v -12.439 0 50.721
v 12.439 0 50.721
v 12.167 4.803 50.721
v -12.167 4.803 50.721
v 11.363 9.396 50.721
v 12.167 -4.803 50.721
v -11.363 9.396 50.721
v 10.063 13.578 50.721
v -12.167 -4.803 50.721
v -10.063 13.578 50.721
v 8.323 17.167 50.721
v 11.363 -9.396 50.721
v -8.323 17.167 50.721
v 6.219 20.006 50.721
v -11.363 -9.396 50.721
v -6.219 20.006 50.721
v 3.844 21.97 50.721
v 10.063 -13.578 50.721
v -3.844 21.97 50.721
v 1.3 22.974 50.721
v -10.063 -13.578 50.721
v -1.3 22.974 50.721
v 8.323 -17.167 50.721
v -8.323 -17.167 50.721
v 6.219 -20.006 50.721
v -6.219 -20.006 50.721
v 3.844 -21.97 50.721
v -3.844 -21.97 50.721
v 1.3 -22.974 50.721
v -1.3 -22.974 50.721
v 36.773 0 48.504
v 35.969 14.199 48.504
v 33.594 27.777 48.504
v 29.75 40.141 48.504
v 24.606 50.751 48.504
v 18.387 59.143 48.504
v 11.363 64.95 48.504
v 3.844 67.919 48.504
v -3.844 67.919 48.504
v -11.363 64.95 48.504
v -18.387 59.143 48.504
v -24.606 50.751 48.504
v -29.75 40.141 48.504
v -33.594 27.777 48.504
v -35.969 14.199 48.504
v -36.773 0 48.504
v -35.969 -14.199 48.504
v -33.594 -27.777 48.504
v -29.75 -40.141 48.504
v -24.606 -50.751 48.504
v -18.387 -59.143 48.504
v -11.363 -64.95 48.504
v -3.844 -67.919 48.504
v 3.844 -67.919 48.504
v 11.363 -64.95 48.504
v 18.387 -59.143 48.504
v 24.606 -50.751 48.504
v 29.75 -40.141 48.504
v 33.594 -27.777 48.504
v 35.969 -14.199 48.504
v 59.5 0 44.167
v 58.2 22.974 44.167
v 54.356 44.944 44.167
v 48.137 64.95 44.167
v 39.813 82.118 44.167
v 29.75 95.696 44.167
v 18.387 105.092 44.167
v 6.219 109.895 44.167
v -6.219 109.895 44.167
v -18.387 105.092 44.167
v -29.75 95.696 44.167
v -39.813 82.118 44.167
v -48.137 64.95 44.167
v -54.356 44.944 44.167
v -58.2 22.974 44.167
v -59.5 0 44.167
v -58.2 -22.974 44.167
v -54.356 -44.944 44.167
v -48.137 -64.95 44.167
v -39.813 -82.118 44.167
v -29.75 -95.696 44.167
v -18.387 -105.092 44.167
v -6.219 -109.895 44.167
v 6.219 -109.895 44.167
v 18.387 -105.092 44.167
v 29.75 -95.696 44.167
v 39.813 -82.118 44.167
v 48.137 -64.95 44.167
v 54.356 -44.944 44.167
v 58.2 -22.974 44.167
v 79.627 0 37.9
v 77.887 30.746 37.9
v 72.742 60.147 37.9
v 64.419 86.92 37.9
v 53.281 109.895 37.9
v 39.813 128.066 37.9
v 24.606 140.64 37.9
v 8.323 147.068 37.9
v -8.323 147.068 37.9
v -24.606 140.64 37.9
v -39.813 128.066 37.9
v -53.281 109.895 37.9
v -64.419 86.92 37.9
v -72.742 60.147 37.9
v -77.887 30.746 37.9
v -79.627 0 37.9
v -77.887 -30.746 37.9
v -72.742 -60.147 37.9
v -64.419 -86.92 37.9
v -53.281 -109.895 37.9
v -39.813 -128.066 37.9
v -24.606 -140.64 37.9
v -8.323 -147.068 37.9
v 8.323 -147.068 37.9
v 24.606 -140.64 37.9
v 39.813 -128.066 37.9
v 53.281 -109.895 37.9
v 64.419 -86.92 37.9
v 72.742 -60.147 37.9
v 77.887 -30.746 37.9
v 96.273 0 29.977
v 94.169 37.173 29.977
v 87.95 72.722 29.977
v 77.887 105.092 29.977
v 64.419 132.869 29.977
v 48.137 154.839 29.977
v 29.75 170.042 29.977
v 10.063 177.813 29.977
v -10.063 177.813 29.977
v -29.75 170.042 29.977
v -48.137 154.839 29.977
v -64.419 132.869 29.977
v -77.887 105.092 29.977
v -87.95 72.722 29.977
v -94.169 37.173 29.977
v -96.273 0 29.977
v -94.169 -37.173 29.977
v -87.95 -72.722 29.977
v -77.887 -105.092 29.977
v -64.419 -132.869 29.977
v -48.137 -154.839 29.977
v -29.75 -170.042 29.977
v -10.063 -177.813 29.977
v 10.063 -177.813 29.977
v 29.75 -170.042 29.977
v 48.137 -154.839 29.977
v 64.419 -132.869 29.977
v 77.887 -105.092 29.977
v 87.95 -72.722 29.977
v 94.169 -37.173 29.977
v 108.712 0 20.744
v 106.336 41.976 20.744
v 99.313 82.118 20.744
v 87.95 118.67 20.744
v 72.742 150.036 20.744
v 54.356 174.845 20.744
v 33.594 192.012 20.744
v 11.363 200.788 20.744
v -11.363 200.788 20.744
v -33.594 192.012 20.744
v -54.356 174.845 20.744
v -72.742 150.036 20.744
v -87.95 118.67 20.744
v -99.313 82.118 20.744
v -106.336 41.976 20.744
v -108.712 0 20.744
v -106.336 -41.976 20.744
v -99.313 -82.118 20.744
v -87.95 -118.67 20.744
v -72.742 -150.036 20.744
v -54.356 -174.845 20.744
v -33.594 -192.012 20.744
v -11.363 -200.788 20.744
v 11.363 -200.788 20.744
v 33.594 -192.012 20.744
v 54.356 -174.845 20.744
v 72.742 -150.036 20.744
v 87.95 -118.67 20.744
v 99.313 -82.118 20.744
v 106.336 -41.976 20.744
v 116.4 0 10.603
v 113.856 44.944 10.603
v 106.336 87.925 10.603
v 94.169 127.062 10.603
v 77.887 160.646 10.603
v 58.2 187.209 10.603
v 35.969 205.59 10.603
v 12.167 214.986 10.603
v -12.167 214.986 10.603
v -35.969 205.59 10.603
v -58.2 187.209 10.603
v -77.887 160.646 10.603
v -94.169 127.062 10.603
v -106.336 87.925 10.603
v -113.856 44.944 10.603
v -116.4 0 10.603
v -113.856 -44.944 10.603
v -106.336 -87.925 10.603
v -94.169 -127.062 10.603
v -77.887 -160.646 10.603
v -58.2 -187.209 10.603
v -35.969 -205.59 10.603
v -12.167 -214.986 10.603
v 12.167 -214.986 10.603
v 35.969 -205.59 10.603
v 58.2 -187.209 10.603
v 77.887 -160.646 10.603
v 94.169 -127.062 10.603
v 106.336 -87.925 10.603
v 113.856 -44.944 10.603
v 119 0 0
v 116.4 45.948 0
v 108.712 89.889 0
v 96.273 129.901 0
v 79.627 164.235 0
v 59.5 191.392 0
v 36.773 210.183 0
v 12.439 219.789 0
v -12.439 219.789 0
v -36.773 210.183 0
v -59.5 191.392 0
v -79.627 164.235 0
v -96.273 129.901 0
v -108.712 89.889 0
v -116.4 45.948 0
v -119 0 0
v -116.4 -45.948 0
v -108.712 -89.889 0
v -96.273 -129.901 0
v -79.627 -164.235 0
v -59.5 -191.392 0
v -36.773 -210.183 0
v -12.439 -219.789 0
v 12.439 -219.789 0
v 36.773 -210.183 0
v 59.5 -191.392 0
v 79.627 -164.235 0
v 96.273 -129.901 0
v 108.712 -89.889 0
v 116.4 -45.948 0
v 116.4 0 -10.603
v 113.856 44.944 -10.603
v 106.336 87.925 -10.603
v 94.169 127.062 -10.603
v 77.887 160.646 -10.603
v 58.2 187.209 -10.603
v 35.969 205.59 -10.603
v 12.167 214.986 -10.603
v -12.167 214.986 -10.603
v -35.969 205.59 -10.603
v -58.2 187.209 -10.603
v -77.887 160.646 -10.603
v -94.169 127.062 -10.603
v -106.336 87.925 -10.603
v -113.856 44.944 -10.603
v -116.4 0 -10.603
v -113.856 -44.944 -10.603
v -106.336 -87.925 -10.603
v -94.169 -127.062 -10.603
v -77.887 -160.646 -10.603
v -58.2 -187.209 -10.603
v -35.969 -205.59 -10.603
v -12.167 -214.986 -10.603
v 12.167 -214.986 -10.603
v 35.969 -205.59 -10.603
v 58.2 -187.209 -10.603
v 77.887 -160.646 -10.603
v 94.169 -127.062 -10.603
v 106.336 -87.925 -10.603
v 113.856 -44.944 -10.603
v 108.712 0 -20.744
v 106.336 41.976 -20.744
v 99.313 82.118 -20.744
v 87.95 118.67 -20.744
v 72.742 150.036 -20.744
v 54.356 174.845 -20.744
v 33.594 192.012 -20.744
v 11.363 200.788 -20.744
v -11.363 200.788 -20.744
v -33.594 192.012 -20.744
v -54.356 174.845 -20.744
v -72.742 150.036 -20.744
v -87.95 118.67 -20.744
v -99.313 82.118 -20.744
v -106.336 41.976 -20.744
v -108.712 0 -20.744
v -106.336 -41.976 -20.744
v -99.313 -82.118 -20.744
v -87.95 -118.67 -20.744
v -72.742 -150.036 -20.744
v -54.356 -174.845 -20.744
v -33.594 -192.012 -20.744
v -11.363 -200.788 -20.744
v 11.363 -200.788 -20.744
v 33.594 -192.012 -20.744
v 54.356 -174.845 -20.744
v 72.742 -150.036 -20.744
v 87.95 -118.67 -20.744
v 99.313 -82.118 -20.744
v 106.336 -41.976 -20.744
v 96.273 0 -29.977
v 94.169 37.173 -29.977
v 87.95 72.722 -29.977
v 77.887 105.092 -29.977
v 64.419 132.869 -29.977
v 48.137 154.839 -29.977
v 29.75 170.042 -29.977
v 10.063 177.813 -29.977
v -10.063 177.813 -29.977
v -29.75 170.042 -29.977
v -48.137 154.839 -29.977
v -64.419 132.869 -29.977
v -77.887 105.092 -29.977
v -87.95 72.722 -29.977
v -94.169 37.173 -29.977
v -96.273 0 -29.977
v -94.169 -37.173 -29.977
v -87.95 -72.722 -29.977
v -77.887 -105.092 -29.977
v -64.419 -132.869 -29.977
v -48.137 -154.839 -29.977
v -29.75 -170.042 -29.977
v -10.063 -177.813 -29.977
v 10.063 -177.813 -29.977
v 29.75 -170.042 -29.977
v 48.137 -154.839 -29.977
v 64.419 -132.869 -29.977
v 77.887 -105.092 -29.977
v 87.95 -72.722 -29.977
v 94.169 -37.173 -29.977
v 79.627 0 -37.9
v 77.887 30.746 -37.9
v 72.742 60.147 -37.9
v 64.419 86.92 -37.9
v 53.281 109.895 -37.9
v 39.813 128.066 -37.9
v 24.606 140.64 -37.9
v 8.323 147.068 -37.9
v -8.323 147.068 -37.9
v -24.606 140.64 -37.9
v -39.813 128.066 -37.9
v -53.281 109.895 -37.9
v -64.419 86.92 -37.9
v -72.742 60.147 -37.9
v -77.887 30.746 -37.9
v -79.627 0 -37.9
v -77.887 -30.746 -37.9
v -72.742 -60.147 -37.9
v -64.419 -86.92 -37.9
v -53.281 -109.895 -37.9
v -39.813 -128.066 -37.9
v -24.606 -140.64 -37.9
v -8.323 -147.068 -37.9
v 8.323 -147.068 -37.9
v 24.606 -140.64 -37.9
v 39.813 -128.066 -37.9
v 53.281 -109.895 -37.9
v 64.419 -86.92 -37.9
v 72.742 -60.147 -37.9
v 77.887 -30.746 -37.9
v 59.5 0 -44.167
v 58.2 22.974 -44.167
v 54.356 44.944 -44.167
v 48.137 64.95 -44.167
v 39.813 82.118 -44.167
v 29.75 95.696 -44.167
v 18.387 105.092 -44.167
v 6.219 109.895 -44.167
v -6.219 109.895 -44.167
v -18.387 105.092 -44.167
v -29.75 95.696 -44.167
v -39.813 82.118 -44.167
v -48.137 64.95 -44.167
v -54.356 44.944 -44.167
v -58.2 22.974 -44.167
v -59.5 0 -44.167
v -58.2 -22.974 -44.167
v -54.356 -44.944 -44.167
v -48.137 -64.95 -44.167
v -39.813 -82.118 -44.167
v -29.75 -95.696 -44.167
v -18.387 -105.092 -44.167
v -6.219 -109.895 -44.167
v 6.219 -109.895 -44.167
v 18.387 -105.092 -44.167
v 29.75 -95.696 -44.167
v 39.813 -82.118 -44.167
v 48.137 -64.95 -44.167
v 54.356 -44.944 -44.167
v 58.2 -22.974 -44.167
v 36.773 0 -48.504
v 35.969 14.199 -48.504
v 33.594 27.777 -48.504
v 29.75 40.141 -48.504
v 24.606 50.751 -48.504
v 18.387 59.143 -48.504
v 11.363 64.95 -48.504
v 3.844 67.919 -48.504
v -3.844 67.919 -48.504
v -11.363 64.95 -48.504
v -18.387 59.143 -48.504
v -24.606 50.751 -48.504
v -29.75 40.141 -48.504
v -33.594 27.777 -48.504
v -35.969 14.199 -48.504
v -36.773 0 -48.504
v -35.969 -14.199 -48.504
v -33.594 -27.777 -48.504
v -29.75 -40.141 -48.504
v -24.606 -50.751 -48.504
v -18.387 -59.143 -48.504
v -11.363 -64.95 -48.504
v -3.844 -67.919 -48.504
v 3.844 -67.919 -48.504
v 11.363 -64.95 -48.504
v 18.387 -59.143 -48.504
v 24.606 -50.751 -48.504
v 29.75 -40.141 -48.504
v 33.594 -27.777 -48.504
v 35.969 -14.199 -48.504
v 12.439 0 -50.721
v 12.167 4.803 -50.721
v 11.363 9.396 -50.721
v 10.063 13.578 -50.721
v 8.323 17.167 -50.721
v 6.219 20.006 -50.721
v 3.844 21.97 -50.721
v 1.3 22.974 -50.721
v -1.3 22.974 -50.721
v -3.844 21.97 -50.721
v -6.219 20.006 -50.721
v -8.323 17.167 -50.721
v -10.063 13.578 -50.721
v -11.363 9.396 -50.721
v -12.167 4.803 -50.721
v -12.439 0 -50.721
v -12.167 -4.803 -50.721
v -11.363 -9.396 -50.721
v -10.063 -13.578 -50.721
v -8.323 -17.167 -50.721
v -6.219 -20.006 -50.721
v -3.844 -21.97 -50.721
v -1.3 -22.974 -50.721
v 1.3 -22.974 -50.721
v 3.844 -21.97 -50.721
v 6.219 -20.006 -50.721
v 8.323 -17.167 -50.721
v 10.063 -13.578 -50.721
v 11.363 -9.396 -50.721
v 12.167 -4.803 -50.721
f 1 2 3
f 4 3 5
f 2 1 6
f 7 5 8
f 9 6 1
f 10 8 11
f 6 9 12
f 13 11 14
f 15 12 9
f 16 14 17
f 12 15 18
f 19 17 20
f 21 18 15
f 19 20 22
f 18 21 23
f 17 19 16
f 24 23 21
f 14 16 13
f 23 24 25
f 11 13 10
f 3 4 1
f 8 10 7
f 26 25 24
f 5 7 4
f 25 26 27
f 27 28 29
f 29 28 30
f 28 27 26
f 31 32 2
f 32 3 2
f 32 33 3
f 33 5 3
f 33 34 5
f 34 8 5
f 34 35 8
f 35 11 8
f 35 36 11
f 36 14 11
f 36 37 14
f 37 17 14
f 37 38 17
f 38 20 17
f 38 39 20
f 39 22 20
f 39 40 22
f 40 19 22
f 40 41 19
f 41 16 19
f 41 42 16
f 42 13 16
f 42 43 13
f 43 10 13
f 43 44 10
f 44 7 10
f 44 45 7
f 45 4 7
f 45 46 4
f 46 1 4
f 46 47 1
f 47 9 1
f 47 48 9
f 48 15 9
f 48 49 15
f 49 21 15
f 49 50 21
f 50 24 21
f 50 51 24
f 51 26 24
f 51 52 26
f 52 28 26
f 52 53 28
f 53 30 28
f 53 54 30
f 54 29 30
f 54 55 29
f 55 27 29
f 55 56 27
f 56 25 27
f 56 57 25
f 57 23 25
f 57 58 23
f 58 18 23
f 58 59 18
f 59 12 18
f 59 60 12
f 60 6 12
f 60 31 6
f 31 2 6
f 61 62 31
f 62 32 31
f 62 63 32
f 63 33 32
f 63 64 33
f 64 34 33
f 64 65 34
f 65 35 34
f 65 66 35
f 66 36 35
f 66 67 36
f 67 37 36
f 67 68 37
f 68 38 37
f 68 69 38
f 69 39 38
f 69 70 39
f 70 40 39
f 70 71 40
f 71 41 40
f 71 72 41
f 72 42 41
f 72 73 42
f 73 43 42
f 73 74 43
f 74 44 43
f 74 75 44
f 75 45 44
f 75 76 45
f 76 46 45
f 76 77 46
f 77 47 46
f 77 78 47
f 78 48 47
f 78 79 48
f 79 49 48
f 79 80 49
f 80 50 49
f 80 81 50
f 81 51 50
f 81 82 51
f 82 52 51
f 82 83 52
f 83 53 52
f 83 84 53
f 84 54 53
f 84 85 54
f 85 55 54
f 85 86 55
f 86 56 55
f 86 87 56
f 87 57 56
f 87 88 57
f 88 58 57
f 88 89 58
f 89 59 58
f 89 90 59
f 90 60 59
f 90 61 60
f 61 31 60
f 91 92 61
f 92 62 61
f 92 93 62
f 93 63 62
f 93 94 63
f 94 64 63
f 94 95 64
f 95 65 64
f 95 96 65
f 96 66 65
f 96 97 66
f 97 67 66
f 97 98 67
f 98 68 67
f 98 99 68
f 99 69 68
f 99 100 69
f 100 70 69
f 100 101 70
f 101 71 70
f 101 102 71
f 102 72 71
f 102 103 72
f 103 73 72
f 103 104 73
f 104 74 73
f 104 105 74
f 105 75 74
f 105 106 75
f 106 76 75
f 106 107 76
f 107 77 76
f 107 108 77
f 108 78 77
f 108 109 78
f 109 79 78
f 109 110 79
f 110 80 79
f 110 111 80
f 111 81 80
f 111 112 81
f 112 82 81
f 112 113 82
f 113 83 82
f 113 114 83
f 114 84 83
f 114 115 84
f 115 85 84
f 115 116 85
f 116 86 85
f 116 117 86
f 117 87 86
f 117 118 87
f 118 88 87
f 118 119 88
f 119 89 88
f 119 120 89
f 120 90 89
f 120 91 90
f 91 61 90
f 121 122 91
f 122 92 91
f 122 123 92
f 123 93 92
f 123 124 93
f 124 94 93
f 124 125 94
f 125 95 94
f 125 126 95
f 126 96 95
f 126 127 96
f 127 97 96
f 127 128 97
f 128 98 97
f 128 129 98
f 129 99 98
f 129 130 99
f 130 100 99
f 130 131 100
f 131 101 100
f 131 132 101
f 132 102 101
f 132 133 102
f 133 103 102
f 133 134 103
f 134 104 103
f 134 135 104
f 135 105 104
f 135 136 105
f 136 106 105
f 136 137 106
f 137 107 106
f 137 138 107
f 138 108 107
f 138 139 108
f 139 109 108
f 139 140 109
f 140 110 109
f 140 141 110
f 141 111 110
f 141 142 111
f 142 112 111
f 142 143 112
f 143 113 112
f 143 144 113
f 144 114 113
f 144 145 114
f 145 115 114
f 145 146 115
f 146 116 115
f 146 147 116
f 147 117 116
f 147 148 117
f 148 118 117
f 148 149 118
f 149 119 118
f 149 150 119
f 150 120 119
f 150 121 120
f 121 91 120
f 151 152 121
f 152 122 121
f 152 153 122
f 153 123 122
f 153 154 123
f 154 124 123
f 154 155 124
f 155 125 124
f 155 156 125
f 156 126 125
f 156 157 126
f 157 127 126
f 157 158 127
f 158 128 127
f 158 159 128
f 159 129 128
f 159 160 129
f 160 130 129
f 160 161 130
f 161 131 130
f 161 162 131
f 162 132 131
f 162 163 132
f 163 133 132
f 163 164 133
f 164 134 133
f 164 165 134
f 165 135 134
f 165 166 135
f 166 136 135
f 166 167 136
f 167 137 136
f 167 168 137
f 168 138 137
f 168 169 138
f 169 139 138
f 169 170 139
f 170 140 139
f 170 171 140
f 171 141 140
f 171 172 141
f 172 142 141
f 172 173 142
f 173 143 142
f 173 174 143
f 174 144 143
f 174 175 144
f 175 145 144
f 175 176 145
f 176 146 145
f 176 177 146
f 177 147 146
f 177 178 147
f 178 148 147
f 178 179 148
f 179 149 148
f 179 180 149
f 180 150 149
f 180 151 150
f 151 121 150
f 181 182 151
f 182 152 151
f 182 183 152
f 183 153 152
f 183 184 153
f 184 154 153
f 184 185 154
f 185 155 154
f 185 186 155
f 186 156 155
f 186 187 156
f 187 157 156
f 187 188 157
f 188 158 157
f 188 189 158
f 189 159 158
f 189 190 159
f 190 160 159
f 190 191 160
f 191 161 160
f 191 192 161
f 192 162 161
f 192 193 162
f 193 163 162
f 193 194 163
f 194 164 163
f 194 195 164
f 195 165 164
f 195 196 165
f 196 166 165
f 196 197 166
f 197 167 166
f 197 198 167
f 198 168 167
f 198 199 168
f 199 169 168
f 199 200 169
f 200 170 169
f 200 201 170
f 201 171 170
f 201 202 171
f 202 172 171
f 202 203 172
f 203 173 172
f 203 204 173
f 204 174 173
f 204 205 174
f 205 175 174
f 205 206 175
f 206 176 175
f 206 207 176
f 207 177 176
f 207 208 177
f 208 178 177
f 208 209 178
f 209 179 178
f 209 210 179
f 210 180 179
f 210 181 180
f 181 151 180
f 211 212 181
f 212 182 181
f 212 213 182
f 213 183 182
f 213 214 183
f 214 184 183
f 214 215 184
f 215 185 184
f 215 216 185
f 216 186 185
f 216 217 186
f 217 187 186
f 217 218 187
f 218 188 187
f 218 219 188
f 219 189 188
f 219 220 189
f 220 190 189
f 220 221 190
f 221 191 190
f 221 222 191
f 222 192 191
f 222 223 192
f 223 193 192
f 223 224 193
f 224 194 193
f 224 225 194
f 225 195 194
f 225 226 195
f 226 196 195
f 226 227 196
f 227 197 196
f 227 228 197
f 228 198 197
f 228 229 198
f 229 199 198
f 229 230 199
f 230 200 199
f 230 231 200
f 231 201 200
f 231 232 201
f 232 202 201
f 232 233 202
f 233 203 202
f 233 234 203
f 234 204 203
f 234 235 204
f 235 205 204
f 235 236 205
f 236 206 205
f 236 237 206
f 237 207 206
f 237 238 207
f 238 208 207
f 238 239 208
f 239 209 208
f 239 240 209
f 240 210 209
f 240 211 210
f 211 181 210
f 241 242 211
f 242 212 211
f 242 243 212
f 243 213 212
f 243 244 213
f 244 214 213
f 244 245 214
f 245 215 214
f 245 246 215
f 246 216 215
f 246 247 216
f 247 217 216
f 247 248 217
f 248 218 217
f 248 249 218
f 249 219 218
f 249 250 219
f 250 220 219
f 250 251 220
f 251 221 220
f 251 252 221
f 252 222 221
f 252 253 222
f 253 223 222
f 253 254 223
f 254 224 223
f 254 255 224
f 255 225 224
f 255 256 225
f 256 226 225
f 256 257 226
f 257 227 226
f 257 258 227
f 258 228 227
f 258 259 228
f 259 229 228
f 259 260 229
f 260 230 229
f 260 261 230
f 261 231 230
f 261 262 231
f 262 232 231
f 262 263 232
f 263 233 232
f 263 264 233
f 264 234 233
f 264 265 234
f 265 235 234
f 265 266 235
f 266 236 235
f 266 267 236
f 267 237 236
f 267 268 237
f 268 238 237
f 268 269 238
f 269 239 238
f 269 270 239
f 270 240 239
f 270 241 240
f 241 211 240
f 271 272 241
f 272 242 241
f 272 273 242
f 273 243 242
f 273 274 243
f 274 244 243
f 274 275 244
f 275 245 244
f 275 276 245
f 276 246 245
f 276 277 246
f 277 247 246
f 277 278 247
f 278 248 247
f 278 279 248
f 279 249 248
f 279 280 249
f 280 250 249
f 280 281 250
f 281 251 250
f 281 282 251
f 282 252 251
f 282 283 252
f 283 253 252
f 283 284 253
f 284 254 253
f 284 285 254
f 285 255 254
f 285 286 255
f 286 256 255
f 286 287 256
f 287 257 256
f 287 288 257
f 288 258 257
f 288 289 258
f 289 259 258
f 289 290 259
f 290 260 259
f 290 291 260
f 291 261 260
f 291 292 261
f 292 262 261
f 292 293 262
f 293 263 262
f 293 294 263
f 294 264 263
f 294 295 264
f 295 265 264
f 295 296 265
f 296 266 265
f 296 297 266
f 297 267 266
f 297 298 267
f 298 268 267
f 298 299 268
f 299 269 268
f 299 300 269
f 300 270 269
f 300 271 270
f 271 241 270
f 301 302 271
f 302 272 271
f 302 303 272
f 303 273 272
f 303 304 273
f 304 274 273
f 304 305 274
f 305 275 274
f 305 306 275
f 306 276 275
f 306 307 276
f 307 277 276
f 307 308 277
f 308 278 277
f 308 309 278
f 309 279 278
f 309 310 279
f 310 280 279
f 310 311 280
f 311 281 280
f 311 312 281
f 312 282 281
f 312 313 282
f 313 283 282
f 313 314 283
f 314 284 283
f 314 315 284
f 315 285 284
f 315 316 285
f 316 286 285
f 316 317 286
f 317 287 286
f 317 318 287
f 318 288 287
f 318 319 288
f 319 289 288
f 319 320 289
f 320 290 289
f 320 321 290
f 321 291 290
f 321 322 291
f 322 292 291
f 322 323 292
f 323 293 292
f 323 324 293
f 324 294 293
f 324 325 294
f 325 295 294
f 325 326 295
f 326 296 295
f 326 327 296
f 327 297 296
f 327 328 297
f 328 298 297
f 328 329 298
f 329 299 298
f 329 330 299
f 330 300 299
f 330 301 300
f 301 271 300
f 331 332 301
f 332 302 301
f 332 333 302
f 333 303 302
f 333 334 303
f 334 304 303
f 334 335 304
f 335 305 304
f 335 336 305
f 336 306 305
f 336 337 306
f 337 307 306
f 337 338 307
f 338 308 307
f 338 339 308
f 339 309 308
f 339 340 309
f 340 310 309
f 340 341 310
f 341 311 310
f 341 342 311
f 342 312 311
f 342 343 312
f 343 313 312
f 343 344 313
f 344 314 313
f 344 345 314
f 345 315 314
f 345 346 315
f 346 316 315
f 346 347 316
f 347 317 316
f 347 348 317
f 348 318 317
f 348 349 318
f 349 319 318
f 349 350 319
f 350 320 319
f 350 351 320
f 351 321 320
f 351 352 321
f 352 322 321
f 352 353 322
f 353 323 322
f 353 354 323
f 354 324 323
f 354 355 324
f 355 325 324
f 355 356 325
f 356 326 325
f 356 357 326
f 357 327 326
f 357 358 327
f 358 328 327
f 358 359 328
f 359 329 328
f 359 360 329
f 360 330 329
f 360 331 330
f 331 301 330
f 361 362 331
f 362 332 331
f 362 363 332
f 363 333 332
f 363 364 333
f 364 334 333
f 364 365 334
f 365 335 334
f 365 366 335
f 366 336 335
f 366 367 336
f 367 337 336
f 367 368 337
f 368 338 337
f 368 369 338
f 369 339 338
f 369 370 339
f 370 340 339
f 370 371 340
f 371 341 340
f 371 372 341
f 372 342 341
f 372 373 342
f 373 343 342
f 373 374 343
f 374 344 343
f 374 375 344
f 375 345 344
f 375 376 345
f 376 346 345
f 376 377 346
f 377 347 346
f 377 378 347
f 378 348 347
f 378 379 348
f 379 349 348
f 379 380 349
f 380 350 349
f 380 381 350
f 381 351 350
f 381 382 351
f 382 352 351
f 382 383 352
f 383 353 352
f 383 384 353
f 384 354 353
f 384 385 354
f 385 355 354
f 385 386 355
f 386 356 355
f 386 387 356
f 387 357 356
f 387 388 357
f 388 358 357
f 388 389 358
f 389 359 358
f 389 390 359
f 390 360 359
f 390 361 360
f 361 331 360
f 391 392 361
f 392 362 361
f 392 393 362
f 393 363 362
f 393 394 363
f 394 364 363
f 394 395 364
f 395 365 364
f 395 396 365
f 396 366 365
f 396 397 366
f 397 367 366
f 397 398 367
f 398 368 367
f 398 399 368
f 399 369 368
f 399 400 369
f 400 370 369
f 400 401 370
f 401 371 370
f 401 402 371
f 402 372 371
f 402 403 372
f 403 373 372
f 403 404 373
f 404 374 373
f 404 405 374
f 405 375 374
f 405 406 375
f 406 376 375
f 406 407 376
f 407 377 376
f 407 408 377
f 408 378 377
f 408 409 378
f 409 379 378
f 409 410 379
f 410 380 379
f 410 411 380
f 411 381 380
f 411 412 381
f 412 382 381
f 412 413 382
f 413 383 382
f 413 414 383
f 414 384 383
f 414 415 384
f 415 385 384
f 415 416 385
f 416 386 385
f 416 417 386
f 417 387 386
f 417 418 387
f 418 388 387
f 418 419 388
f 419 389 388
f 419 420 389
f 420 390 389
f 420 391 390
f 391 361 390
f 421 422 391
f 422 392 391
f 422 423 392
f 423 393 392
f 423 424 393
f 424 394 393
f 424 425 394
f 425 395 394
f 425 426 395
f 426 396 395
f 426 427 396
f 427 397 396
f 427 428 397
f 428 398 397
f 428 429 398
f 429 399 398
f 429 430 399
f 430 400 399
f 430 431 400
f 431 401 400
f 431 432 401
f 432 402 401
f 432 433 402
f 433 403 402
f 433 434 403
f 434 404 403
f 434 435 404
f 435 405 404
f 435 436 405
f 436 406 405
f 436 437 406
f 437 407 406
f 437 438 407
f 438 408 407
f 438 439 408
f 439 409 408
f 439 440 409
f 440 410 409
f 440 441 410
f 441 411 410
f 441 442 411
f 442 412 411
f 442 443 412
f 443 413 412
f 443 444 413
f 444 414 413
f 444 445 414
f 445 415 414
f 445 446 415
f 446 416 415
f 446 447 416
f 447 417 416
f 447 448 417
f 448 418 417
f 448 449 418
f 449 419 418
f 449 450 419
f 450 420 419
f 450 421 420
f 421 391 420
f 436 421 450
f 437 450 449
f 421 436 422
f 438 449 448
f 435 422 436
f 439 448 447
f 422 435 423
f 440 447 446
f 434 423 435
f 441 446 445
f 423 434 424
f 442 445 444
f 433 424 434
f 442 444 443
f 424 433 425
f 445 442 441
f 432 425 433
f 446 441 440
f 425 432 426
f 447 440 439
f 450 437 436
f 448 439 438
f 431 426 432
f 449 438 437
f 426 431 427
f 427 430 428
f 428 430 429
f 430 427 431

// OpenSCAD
// Generated by SolidPython 1.0.1 on 2020-07-29 00:46:47


scale(v = [7, 13, 3]) {
	sphere(r = 17);
}
/***********************************************
*********      SolidPython code:      **********
************************************************
 
# import packages: SolidPython
from solid import *
from solid.utils import *
from itertools import chain, combinations, permutations


class Resize:

    def __init__(self, scad_file):
        self.scad_file = scad_file
        #self.scad_file = import_scad(scad_file)
        # cone/cylinder param:
        self.r1 = 0
        self.r2 = 0
        self.h = 0
        # rectangular prism param:
        self.w = 0
        self.l = 0
        # ellipse param:
        self.r = 0

    # import OpenScad code (file name corresponds to shape)


    # classify shape + parameters
    def assign(self, param1, param2, param3):
        if self.scad_file == 'cone.scad':
            self.r1 = param1
            self.r2 = param2
            self.h = param3
        elif self.scad_file == 'cylinder.scad':
            self.r1 = param1
            self.r2 = param2
            self.h = param3
        elif self.scad_file == 'rectangularPrism.scad':
            self.h = param1
            self.l = param2
            self.w = param3
        else:
            self.r = param1
            self.h = param2

    # resize parameters
    def iterate(self):
        x = range(3, 20, 2)
        i = 1
        if self.scad_file == 'cone.scad':
            tempList = list(permutations(x, 2))
            for temp in tempList:
                param1 = temp[0]
                param2 = temp[1]
                filepath = 'produced_scad_files/' + 'cone' + str(param1) + '_' + str(param2) + '_' + '.scad'
                scad_render_to_file(cylinder(h=param1, r1=param2, r2=0), filepath)

        elif self.scad_file == 'cylinder.scad':
            tempList = list(permutations(x, 3))
            for temp in tempList:
                param1 = temp[0]
                param2 = temp[1]
                filepath = 'produced_scad_files/' + 'cylinder' + str(param1) + '_' + str(param2) + '_' + '.scad'
                scad_render_to_file(cylinder(h=param1, r1=param2, r2=param2), filepath)

        elif self.scad_file == 'rectangularPrism.scad':
            tempList = list(permutations(x, 3))
            for temp in tempList:
                param1 = temp[0]
                param2 = temp[1]
                param3 = temp[2]
                filepath = 'produced_scad_files/' + 'rectangularPrism' + str(param1) + '_' + str(param2) + '_' + str(
                    param3) + '.scad'
                scad_render_to_file(cube(size=(param1, param2, param3)), filepath)

        elif self.scad_file == 'ellipse.scad':
            tempList = list(permutations(x, 4))
            for temp in tempList:
                param1 = temp[0]
                param2 = temp[1]
                param3 = temp[2]
                param4 = temp[3]
                filepath = 'produced_scad_files/' + 'ellipse' + str(param1) + '_' + str(param2) + '_' + str(param3) + '_' + str(param4) + '.scad'
                scad_render_to_file(scale([param1, param2, param3])(sphere(r=param4)), filepath)

    def render_to_scadfile(self):
        scad_render_to_file(scad, 'example.scad') 
 
************************************************/
